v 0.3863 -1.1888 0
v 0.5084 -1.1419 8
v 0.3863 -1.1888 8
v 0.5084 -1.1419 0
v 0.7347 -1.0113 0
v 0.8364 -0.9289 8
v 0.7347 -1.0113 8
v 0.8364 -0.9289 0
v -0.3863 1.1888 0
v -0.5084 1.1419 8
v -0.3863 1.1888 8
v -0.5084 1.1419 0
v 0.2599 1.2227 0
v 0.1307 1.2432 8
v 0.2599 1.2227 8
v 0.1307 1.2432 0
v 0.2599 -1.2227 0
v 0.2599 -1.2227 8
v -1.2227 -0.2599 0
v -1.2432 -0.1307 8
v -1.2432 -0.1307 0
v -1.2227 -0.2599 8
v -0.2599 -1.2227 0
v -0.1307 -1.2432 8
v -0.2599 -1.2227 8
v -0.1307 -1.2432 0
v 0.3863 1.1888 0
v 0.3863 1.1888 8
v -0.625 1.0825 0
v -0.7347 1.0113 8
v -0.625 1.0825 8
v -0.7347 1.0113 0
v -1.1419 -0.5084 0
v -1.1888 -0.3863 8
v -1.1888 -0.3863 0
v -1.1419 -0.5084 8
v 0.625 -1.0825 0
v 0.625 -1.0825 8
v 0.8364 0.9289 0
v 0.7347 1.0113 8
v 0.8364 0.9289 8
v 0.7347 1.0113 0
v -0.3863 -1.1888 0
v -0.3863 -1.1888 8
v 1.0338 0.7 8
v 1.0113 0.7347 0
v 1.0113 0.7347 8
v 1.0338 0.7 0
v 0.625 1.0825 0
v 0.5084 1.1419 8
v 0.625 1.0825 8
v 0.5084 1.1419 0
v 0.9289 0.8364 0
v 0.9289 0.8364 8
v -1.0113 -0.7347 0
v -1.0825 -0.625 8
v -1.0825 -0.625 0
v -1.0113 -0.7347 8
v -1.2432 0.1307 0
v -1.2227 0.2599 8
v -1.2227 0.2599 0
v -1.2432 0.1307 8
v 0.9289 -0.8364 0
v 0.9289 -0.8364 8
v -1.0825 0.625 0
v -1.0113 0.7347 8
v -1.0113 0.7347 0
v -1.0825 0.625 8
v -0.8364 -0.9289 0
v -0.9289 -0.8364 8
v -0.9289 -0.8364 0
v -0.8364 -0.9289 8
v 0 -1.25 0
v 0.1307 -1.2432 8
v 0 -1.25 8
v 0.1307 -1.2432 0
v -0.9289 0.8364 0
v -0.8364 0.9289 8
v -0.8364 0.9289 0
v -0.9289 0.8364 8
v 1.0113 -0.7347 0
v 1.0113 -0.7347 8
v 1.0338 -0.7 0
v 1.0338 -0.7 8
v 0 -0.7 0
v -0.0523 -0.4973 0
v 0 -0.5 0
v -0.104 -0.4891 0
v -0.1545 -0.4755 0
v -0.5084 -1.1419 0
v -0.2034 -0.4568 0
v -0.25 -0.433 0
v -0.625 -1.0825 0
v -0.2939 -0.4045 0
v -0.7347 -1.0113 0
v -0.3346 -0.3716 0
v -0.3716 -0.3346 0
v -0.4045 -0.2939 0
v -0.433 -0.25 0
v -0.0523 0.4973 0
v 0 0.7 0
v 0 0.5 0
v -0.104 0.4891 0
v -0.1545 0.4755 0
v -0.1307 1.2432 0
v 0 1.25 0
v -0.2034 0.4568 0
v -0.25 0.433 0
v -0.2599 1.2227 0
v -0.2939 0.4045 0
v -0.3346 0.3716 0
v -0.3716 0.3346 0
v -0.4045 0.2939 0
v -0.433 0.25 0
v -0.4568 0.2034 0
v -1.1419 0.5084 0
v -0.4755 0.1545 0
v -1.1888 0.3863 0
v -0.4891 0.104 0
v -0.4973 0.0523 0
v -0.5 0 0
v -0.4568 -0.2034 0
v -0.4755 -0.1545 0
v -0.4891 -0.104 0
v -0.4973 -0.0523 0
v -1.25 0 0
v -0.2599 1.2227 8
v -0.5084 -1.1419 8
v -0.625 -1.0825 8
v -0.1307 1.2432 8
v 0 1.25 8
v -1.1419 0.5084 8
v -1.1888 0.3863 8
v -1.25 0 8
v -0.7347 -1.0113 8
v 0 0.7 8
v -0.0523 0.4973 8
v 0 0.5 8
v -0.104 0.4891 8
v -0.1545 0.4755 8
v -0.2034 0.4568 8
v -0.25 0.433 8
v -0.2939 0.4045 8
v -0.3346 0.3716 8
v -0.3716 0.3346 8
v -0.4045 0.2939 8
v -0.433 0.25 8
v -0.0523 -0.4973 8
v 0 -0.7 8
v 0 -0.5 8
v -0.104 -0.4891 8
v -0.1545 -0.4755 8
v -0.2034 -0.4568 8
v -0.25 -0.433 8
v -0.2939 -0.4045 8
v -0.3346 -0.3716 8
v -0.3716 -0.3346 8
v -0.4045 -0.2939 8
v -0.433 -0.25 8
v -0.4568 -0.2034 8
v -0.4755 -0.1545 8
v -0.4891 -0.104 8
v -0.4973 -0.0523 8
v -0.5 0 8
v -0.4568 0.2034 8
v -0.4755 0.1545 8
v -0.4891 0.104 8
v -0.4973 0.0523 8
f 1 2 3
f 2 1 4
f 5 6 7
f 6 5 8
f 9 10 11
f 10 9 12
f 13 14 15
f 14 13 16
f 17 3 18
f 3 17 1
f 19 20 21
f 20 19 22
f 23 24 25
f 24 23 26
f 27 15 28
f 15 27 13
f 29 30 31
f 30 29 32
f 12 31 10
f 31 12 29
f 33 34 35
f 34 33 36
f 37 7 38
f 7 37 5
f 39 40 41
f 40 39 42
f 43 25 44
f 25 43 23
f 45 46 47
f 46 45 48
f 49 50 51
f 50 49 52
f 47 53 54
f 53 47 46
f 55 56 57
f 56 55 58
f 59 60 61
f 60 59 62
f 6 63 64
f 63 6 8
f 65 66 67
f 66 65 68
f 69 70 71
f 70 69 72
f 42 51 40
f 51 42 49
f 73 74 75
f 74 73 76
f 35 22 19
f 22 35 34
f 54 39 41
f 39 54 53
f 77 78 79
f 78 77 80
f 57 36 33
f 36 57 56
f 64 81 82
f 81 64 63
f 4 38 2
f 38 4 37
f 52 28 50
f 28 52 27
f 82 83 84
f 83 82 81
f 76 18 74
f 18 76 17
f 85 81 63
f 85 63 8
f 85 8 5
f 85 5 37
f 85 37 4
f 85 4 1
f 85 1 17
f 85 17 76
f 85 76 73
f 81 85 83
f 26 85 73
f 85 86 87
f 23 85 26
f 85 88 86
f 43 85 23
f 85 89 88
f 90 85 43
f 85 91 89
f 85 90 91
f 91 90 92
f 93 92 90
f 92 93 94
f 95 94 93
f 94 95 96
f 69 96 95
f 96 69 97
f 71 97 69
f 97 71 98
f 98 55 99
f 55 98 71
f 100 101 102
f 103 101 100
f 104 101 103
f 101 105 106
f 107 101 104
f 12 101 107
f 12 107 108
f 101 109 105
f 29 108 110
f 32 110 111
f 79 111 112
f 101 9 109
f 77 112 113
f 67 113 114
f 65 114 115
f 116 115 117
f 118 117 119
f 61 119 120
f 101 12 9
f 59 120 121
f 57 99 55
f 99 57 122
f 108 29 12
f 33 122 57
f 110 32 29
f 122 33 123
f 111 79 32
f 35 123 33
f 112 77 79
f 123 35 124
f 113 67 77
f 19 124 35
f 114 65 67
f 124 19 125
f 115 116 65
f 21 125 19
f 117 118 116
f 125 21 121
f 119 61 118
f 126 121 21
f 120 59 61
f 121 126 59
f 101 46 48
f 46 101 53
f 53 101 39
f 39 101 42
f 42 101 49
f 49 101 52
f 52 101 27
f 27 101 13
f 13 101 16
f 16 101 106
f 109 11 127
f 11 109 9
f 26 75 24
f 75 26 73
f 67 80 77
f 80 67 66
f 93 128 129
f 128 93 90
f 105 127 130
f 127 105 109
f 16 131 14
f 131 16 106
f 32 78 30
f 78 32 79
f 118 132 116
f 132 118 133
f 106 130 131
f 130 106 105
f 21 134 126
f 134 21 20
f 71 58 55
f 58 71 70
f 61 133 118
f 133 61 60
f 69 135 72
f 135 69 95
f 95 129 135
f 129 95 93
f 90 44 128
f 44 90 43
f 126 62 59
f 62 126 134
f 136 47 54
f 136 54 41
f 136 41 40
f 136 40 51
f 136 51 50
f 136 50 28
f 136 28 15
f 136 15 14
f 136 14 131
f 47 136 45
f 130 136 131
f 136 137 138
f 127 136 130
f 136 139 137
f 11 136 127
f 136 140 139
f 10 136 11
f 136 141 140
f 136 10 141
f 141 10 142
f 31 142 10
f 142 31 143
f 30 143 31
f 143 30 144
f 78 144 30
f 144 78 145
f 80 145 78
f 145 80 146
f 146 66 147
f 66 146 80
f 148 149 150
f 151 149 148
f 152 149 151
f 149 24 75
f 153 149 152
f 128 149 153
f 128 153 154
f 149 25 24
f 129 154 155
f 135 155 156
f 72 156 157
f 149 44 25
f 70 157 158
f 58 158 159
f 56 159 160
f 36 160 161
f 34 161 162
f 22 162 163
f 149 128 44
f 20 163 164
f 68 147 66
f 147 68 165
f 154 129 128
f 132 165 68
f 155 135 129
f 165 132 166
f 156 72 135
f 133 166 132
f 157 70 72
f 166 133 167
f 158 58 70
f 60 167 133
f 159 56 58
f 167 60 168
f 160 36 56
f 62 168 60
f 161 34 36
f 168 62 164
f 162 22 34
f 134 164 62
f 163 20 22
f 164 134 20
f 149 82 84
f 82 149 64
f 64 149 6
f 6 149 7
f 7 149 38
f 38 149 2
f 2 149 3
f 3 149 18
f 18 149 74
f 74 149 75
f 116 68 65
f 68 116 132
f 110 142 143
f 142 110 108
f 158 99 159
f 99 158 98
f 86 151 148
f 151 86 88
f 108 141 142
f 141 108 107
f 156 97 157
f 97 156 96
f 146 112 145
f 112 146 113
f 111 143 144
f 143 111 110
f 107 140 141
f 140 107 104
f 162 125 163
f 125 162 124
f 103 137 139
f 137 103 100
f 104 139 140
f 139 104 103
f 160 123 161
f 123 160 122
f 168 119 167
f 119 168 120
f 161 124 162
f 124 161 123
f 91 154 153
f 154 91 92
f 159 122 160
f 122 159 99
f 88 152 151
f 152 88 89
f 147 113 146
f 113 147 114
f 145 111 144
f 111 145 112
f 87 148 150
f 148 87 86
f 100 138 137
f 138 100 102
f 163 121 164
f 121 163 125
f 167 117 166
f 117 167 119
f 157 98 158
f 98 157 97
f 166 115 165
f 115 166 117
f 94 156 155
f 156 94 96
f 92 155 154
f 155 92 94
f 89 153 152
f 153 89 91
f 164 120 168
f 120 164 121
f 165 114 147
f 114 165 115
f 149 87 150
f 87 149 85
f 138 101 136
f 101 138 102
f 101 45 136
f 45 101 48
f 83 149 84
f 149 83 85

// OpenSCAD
// Slotted roll pin.
$fn = 60;
eps = 0.02;
inner_d = 1;
outer_d = 2.5;
length = 8;
slot = 1.4;
difference() {
    cylinder(d=outer_d,h=length);
    translate([0,0,-eps]) cylinder(d=inner_d,h=length+2*eps);
    translate([0,-slot/2,-eps]) cube([outer_d/2+eps,slot,length+2*eps]);
}
